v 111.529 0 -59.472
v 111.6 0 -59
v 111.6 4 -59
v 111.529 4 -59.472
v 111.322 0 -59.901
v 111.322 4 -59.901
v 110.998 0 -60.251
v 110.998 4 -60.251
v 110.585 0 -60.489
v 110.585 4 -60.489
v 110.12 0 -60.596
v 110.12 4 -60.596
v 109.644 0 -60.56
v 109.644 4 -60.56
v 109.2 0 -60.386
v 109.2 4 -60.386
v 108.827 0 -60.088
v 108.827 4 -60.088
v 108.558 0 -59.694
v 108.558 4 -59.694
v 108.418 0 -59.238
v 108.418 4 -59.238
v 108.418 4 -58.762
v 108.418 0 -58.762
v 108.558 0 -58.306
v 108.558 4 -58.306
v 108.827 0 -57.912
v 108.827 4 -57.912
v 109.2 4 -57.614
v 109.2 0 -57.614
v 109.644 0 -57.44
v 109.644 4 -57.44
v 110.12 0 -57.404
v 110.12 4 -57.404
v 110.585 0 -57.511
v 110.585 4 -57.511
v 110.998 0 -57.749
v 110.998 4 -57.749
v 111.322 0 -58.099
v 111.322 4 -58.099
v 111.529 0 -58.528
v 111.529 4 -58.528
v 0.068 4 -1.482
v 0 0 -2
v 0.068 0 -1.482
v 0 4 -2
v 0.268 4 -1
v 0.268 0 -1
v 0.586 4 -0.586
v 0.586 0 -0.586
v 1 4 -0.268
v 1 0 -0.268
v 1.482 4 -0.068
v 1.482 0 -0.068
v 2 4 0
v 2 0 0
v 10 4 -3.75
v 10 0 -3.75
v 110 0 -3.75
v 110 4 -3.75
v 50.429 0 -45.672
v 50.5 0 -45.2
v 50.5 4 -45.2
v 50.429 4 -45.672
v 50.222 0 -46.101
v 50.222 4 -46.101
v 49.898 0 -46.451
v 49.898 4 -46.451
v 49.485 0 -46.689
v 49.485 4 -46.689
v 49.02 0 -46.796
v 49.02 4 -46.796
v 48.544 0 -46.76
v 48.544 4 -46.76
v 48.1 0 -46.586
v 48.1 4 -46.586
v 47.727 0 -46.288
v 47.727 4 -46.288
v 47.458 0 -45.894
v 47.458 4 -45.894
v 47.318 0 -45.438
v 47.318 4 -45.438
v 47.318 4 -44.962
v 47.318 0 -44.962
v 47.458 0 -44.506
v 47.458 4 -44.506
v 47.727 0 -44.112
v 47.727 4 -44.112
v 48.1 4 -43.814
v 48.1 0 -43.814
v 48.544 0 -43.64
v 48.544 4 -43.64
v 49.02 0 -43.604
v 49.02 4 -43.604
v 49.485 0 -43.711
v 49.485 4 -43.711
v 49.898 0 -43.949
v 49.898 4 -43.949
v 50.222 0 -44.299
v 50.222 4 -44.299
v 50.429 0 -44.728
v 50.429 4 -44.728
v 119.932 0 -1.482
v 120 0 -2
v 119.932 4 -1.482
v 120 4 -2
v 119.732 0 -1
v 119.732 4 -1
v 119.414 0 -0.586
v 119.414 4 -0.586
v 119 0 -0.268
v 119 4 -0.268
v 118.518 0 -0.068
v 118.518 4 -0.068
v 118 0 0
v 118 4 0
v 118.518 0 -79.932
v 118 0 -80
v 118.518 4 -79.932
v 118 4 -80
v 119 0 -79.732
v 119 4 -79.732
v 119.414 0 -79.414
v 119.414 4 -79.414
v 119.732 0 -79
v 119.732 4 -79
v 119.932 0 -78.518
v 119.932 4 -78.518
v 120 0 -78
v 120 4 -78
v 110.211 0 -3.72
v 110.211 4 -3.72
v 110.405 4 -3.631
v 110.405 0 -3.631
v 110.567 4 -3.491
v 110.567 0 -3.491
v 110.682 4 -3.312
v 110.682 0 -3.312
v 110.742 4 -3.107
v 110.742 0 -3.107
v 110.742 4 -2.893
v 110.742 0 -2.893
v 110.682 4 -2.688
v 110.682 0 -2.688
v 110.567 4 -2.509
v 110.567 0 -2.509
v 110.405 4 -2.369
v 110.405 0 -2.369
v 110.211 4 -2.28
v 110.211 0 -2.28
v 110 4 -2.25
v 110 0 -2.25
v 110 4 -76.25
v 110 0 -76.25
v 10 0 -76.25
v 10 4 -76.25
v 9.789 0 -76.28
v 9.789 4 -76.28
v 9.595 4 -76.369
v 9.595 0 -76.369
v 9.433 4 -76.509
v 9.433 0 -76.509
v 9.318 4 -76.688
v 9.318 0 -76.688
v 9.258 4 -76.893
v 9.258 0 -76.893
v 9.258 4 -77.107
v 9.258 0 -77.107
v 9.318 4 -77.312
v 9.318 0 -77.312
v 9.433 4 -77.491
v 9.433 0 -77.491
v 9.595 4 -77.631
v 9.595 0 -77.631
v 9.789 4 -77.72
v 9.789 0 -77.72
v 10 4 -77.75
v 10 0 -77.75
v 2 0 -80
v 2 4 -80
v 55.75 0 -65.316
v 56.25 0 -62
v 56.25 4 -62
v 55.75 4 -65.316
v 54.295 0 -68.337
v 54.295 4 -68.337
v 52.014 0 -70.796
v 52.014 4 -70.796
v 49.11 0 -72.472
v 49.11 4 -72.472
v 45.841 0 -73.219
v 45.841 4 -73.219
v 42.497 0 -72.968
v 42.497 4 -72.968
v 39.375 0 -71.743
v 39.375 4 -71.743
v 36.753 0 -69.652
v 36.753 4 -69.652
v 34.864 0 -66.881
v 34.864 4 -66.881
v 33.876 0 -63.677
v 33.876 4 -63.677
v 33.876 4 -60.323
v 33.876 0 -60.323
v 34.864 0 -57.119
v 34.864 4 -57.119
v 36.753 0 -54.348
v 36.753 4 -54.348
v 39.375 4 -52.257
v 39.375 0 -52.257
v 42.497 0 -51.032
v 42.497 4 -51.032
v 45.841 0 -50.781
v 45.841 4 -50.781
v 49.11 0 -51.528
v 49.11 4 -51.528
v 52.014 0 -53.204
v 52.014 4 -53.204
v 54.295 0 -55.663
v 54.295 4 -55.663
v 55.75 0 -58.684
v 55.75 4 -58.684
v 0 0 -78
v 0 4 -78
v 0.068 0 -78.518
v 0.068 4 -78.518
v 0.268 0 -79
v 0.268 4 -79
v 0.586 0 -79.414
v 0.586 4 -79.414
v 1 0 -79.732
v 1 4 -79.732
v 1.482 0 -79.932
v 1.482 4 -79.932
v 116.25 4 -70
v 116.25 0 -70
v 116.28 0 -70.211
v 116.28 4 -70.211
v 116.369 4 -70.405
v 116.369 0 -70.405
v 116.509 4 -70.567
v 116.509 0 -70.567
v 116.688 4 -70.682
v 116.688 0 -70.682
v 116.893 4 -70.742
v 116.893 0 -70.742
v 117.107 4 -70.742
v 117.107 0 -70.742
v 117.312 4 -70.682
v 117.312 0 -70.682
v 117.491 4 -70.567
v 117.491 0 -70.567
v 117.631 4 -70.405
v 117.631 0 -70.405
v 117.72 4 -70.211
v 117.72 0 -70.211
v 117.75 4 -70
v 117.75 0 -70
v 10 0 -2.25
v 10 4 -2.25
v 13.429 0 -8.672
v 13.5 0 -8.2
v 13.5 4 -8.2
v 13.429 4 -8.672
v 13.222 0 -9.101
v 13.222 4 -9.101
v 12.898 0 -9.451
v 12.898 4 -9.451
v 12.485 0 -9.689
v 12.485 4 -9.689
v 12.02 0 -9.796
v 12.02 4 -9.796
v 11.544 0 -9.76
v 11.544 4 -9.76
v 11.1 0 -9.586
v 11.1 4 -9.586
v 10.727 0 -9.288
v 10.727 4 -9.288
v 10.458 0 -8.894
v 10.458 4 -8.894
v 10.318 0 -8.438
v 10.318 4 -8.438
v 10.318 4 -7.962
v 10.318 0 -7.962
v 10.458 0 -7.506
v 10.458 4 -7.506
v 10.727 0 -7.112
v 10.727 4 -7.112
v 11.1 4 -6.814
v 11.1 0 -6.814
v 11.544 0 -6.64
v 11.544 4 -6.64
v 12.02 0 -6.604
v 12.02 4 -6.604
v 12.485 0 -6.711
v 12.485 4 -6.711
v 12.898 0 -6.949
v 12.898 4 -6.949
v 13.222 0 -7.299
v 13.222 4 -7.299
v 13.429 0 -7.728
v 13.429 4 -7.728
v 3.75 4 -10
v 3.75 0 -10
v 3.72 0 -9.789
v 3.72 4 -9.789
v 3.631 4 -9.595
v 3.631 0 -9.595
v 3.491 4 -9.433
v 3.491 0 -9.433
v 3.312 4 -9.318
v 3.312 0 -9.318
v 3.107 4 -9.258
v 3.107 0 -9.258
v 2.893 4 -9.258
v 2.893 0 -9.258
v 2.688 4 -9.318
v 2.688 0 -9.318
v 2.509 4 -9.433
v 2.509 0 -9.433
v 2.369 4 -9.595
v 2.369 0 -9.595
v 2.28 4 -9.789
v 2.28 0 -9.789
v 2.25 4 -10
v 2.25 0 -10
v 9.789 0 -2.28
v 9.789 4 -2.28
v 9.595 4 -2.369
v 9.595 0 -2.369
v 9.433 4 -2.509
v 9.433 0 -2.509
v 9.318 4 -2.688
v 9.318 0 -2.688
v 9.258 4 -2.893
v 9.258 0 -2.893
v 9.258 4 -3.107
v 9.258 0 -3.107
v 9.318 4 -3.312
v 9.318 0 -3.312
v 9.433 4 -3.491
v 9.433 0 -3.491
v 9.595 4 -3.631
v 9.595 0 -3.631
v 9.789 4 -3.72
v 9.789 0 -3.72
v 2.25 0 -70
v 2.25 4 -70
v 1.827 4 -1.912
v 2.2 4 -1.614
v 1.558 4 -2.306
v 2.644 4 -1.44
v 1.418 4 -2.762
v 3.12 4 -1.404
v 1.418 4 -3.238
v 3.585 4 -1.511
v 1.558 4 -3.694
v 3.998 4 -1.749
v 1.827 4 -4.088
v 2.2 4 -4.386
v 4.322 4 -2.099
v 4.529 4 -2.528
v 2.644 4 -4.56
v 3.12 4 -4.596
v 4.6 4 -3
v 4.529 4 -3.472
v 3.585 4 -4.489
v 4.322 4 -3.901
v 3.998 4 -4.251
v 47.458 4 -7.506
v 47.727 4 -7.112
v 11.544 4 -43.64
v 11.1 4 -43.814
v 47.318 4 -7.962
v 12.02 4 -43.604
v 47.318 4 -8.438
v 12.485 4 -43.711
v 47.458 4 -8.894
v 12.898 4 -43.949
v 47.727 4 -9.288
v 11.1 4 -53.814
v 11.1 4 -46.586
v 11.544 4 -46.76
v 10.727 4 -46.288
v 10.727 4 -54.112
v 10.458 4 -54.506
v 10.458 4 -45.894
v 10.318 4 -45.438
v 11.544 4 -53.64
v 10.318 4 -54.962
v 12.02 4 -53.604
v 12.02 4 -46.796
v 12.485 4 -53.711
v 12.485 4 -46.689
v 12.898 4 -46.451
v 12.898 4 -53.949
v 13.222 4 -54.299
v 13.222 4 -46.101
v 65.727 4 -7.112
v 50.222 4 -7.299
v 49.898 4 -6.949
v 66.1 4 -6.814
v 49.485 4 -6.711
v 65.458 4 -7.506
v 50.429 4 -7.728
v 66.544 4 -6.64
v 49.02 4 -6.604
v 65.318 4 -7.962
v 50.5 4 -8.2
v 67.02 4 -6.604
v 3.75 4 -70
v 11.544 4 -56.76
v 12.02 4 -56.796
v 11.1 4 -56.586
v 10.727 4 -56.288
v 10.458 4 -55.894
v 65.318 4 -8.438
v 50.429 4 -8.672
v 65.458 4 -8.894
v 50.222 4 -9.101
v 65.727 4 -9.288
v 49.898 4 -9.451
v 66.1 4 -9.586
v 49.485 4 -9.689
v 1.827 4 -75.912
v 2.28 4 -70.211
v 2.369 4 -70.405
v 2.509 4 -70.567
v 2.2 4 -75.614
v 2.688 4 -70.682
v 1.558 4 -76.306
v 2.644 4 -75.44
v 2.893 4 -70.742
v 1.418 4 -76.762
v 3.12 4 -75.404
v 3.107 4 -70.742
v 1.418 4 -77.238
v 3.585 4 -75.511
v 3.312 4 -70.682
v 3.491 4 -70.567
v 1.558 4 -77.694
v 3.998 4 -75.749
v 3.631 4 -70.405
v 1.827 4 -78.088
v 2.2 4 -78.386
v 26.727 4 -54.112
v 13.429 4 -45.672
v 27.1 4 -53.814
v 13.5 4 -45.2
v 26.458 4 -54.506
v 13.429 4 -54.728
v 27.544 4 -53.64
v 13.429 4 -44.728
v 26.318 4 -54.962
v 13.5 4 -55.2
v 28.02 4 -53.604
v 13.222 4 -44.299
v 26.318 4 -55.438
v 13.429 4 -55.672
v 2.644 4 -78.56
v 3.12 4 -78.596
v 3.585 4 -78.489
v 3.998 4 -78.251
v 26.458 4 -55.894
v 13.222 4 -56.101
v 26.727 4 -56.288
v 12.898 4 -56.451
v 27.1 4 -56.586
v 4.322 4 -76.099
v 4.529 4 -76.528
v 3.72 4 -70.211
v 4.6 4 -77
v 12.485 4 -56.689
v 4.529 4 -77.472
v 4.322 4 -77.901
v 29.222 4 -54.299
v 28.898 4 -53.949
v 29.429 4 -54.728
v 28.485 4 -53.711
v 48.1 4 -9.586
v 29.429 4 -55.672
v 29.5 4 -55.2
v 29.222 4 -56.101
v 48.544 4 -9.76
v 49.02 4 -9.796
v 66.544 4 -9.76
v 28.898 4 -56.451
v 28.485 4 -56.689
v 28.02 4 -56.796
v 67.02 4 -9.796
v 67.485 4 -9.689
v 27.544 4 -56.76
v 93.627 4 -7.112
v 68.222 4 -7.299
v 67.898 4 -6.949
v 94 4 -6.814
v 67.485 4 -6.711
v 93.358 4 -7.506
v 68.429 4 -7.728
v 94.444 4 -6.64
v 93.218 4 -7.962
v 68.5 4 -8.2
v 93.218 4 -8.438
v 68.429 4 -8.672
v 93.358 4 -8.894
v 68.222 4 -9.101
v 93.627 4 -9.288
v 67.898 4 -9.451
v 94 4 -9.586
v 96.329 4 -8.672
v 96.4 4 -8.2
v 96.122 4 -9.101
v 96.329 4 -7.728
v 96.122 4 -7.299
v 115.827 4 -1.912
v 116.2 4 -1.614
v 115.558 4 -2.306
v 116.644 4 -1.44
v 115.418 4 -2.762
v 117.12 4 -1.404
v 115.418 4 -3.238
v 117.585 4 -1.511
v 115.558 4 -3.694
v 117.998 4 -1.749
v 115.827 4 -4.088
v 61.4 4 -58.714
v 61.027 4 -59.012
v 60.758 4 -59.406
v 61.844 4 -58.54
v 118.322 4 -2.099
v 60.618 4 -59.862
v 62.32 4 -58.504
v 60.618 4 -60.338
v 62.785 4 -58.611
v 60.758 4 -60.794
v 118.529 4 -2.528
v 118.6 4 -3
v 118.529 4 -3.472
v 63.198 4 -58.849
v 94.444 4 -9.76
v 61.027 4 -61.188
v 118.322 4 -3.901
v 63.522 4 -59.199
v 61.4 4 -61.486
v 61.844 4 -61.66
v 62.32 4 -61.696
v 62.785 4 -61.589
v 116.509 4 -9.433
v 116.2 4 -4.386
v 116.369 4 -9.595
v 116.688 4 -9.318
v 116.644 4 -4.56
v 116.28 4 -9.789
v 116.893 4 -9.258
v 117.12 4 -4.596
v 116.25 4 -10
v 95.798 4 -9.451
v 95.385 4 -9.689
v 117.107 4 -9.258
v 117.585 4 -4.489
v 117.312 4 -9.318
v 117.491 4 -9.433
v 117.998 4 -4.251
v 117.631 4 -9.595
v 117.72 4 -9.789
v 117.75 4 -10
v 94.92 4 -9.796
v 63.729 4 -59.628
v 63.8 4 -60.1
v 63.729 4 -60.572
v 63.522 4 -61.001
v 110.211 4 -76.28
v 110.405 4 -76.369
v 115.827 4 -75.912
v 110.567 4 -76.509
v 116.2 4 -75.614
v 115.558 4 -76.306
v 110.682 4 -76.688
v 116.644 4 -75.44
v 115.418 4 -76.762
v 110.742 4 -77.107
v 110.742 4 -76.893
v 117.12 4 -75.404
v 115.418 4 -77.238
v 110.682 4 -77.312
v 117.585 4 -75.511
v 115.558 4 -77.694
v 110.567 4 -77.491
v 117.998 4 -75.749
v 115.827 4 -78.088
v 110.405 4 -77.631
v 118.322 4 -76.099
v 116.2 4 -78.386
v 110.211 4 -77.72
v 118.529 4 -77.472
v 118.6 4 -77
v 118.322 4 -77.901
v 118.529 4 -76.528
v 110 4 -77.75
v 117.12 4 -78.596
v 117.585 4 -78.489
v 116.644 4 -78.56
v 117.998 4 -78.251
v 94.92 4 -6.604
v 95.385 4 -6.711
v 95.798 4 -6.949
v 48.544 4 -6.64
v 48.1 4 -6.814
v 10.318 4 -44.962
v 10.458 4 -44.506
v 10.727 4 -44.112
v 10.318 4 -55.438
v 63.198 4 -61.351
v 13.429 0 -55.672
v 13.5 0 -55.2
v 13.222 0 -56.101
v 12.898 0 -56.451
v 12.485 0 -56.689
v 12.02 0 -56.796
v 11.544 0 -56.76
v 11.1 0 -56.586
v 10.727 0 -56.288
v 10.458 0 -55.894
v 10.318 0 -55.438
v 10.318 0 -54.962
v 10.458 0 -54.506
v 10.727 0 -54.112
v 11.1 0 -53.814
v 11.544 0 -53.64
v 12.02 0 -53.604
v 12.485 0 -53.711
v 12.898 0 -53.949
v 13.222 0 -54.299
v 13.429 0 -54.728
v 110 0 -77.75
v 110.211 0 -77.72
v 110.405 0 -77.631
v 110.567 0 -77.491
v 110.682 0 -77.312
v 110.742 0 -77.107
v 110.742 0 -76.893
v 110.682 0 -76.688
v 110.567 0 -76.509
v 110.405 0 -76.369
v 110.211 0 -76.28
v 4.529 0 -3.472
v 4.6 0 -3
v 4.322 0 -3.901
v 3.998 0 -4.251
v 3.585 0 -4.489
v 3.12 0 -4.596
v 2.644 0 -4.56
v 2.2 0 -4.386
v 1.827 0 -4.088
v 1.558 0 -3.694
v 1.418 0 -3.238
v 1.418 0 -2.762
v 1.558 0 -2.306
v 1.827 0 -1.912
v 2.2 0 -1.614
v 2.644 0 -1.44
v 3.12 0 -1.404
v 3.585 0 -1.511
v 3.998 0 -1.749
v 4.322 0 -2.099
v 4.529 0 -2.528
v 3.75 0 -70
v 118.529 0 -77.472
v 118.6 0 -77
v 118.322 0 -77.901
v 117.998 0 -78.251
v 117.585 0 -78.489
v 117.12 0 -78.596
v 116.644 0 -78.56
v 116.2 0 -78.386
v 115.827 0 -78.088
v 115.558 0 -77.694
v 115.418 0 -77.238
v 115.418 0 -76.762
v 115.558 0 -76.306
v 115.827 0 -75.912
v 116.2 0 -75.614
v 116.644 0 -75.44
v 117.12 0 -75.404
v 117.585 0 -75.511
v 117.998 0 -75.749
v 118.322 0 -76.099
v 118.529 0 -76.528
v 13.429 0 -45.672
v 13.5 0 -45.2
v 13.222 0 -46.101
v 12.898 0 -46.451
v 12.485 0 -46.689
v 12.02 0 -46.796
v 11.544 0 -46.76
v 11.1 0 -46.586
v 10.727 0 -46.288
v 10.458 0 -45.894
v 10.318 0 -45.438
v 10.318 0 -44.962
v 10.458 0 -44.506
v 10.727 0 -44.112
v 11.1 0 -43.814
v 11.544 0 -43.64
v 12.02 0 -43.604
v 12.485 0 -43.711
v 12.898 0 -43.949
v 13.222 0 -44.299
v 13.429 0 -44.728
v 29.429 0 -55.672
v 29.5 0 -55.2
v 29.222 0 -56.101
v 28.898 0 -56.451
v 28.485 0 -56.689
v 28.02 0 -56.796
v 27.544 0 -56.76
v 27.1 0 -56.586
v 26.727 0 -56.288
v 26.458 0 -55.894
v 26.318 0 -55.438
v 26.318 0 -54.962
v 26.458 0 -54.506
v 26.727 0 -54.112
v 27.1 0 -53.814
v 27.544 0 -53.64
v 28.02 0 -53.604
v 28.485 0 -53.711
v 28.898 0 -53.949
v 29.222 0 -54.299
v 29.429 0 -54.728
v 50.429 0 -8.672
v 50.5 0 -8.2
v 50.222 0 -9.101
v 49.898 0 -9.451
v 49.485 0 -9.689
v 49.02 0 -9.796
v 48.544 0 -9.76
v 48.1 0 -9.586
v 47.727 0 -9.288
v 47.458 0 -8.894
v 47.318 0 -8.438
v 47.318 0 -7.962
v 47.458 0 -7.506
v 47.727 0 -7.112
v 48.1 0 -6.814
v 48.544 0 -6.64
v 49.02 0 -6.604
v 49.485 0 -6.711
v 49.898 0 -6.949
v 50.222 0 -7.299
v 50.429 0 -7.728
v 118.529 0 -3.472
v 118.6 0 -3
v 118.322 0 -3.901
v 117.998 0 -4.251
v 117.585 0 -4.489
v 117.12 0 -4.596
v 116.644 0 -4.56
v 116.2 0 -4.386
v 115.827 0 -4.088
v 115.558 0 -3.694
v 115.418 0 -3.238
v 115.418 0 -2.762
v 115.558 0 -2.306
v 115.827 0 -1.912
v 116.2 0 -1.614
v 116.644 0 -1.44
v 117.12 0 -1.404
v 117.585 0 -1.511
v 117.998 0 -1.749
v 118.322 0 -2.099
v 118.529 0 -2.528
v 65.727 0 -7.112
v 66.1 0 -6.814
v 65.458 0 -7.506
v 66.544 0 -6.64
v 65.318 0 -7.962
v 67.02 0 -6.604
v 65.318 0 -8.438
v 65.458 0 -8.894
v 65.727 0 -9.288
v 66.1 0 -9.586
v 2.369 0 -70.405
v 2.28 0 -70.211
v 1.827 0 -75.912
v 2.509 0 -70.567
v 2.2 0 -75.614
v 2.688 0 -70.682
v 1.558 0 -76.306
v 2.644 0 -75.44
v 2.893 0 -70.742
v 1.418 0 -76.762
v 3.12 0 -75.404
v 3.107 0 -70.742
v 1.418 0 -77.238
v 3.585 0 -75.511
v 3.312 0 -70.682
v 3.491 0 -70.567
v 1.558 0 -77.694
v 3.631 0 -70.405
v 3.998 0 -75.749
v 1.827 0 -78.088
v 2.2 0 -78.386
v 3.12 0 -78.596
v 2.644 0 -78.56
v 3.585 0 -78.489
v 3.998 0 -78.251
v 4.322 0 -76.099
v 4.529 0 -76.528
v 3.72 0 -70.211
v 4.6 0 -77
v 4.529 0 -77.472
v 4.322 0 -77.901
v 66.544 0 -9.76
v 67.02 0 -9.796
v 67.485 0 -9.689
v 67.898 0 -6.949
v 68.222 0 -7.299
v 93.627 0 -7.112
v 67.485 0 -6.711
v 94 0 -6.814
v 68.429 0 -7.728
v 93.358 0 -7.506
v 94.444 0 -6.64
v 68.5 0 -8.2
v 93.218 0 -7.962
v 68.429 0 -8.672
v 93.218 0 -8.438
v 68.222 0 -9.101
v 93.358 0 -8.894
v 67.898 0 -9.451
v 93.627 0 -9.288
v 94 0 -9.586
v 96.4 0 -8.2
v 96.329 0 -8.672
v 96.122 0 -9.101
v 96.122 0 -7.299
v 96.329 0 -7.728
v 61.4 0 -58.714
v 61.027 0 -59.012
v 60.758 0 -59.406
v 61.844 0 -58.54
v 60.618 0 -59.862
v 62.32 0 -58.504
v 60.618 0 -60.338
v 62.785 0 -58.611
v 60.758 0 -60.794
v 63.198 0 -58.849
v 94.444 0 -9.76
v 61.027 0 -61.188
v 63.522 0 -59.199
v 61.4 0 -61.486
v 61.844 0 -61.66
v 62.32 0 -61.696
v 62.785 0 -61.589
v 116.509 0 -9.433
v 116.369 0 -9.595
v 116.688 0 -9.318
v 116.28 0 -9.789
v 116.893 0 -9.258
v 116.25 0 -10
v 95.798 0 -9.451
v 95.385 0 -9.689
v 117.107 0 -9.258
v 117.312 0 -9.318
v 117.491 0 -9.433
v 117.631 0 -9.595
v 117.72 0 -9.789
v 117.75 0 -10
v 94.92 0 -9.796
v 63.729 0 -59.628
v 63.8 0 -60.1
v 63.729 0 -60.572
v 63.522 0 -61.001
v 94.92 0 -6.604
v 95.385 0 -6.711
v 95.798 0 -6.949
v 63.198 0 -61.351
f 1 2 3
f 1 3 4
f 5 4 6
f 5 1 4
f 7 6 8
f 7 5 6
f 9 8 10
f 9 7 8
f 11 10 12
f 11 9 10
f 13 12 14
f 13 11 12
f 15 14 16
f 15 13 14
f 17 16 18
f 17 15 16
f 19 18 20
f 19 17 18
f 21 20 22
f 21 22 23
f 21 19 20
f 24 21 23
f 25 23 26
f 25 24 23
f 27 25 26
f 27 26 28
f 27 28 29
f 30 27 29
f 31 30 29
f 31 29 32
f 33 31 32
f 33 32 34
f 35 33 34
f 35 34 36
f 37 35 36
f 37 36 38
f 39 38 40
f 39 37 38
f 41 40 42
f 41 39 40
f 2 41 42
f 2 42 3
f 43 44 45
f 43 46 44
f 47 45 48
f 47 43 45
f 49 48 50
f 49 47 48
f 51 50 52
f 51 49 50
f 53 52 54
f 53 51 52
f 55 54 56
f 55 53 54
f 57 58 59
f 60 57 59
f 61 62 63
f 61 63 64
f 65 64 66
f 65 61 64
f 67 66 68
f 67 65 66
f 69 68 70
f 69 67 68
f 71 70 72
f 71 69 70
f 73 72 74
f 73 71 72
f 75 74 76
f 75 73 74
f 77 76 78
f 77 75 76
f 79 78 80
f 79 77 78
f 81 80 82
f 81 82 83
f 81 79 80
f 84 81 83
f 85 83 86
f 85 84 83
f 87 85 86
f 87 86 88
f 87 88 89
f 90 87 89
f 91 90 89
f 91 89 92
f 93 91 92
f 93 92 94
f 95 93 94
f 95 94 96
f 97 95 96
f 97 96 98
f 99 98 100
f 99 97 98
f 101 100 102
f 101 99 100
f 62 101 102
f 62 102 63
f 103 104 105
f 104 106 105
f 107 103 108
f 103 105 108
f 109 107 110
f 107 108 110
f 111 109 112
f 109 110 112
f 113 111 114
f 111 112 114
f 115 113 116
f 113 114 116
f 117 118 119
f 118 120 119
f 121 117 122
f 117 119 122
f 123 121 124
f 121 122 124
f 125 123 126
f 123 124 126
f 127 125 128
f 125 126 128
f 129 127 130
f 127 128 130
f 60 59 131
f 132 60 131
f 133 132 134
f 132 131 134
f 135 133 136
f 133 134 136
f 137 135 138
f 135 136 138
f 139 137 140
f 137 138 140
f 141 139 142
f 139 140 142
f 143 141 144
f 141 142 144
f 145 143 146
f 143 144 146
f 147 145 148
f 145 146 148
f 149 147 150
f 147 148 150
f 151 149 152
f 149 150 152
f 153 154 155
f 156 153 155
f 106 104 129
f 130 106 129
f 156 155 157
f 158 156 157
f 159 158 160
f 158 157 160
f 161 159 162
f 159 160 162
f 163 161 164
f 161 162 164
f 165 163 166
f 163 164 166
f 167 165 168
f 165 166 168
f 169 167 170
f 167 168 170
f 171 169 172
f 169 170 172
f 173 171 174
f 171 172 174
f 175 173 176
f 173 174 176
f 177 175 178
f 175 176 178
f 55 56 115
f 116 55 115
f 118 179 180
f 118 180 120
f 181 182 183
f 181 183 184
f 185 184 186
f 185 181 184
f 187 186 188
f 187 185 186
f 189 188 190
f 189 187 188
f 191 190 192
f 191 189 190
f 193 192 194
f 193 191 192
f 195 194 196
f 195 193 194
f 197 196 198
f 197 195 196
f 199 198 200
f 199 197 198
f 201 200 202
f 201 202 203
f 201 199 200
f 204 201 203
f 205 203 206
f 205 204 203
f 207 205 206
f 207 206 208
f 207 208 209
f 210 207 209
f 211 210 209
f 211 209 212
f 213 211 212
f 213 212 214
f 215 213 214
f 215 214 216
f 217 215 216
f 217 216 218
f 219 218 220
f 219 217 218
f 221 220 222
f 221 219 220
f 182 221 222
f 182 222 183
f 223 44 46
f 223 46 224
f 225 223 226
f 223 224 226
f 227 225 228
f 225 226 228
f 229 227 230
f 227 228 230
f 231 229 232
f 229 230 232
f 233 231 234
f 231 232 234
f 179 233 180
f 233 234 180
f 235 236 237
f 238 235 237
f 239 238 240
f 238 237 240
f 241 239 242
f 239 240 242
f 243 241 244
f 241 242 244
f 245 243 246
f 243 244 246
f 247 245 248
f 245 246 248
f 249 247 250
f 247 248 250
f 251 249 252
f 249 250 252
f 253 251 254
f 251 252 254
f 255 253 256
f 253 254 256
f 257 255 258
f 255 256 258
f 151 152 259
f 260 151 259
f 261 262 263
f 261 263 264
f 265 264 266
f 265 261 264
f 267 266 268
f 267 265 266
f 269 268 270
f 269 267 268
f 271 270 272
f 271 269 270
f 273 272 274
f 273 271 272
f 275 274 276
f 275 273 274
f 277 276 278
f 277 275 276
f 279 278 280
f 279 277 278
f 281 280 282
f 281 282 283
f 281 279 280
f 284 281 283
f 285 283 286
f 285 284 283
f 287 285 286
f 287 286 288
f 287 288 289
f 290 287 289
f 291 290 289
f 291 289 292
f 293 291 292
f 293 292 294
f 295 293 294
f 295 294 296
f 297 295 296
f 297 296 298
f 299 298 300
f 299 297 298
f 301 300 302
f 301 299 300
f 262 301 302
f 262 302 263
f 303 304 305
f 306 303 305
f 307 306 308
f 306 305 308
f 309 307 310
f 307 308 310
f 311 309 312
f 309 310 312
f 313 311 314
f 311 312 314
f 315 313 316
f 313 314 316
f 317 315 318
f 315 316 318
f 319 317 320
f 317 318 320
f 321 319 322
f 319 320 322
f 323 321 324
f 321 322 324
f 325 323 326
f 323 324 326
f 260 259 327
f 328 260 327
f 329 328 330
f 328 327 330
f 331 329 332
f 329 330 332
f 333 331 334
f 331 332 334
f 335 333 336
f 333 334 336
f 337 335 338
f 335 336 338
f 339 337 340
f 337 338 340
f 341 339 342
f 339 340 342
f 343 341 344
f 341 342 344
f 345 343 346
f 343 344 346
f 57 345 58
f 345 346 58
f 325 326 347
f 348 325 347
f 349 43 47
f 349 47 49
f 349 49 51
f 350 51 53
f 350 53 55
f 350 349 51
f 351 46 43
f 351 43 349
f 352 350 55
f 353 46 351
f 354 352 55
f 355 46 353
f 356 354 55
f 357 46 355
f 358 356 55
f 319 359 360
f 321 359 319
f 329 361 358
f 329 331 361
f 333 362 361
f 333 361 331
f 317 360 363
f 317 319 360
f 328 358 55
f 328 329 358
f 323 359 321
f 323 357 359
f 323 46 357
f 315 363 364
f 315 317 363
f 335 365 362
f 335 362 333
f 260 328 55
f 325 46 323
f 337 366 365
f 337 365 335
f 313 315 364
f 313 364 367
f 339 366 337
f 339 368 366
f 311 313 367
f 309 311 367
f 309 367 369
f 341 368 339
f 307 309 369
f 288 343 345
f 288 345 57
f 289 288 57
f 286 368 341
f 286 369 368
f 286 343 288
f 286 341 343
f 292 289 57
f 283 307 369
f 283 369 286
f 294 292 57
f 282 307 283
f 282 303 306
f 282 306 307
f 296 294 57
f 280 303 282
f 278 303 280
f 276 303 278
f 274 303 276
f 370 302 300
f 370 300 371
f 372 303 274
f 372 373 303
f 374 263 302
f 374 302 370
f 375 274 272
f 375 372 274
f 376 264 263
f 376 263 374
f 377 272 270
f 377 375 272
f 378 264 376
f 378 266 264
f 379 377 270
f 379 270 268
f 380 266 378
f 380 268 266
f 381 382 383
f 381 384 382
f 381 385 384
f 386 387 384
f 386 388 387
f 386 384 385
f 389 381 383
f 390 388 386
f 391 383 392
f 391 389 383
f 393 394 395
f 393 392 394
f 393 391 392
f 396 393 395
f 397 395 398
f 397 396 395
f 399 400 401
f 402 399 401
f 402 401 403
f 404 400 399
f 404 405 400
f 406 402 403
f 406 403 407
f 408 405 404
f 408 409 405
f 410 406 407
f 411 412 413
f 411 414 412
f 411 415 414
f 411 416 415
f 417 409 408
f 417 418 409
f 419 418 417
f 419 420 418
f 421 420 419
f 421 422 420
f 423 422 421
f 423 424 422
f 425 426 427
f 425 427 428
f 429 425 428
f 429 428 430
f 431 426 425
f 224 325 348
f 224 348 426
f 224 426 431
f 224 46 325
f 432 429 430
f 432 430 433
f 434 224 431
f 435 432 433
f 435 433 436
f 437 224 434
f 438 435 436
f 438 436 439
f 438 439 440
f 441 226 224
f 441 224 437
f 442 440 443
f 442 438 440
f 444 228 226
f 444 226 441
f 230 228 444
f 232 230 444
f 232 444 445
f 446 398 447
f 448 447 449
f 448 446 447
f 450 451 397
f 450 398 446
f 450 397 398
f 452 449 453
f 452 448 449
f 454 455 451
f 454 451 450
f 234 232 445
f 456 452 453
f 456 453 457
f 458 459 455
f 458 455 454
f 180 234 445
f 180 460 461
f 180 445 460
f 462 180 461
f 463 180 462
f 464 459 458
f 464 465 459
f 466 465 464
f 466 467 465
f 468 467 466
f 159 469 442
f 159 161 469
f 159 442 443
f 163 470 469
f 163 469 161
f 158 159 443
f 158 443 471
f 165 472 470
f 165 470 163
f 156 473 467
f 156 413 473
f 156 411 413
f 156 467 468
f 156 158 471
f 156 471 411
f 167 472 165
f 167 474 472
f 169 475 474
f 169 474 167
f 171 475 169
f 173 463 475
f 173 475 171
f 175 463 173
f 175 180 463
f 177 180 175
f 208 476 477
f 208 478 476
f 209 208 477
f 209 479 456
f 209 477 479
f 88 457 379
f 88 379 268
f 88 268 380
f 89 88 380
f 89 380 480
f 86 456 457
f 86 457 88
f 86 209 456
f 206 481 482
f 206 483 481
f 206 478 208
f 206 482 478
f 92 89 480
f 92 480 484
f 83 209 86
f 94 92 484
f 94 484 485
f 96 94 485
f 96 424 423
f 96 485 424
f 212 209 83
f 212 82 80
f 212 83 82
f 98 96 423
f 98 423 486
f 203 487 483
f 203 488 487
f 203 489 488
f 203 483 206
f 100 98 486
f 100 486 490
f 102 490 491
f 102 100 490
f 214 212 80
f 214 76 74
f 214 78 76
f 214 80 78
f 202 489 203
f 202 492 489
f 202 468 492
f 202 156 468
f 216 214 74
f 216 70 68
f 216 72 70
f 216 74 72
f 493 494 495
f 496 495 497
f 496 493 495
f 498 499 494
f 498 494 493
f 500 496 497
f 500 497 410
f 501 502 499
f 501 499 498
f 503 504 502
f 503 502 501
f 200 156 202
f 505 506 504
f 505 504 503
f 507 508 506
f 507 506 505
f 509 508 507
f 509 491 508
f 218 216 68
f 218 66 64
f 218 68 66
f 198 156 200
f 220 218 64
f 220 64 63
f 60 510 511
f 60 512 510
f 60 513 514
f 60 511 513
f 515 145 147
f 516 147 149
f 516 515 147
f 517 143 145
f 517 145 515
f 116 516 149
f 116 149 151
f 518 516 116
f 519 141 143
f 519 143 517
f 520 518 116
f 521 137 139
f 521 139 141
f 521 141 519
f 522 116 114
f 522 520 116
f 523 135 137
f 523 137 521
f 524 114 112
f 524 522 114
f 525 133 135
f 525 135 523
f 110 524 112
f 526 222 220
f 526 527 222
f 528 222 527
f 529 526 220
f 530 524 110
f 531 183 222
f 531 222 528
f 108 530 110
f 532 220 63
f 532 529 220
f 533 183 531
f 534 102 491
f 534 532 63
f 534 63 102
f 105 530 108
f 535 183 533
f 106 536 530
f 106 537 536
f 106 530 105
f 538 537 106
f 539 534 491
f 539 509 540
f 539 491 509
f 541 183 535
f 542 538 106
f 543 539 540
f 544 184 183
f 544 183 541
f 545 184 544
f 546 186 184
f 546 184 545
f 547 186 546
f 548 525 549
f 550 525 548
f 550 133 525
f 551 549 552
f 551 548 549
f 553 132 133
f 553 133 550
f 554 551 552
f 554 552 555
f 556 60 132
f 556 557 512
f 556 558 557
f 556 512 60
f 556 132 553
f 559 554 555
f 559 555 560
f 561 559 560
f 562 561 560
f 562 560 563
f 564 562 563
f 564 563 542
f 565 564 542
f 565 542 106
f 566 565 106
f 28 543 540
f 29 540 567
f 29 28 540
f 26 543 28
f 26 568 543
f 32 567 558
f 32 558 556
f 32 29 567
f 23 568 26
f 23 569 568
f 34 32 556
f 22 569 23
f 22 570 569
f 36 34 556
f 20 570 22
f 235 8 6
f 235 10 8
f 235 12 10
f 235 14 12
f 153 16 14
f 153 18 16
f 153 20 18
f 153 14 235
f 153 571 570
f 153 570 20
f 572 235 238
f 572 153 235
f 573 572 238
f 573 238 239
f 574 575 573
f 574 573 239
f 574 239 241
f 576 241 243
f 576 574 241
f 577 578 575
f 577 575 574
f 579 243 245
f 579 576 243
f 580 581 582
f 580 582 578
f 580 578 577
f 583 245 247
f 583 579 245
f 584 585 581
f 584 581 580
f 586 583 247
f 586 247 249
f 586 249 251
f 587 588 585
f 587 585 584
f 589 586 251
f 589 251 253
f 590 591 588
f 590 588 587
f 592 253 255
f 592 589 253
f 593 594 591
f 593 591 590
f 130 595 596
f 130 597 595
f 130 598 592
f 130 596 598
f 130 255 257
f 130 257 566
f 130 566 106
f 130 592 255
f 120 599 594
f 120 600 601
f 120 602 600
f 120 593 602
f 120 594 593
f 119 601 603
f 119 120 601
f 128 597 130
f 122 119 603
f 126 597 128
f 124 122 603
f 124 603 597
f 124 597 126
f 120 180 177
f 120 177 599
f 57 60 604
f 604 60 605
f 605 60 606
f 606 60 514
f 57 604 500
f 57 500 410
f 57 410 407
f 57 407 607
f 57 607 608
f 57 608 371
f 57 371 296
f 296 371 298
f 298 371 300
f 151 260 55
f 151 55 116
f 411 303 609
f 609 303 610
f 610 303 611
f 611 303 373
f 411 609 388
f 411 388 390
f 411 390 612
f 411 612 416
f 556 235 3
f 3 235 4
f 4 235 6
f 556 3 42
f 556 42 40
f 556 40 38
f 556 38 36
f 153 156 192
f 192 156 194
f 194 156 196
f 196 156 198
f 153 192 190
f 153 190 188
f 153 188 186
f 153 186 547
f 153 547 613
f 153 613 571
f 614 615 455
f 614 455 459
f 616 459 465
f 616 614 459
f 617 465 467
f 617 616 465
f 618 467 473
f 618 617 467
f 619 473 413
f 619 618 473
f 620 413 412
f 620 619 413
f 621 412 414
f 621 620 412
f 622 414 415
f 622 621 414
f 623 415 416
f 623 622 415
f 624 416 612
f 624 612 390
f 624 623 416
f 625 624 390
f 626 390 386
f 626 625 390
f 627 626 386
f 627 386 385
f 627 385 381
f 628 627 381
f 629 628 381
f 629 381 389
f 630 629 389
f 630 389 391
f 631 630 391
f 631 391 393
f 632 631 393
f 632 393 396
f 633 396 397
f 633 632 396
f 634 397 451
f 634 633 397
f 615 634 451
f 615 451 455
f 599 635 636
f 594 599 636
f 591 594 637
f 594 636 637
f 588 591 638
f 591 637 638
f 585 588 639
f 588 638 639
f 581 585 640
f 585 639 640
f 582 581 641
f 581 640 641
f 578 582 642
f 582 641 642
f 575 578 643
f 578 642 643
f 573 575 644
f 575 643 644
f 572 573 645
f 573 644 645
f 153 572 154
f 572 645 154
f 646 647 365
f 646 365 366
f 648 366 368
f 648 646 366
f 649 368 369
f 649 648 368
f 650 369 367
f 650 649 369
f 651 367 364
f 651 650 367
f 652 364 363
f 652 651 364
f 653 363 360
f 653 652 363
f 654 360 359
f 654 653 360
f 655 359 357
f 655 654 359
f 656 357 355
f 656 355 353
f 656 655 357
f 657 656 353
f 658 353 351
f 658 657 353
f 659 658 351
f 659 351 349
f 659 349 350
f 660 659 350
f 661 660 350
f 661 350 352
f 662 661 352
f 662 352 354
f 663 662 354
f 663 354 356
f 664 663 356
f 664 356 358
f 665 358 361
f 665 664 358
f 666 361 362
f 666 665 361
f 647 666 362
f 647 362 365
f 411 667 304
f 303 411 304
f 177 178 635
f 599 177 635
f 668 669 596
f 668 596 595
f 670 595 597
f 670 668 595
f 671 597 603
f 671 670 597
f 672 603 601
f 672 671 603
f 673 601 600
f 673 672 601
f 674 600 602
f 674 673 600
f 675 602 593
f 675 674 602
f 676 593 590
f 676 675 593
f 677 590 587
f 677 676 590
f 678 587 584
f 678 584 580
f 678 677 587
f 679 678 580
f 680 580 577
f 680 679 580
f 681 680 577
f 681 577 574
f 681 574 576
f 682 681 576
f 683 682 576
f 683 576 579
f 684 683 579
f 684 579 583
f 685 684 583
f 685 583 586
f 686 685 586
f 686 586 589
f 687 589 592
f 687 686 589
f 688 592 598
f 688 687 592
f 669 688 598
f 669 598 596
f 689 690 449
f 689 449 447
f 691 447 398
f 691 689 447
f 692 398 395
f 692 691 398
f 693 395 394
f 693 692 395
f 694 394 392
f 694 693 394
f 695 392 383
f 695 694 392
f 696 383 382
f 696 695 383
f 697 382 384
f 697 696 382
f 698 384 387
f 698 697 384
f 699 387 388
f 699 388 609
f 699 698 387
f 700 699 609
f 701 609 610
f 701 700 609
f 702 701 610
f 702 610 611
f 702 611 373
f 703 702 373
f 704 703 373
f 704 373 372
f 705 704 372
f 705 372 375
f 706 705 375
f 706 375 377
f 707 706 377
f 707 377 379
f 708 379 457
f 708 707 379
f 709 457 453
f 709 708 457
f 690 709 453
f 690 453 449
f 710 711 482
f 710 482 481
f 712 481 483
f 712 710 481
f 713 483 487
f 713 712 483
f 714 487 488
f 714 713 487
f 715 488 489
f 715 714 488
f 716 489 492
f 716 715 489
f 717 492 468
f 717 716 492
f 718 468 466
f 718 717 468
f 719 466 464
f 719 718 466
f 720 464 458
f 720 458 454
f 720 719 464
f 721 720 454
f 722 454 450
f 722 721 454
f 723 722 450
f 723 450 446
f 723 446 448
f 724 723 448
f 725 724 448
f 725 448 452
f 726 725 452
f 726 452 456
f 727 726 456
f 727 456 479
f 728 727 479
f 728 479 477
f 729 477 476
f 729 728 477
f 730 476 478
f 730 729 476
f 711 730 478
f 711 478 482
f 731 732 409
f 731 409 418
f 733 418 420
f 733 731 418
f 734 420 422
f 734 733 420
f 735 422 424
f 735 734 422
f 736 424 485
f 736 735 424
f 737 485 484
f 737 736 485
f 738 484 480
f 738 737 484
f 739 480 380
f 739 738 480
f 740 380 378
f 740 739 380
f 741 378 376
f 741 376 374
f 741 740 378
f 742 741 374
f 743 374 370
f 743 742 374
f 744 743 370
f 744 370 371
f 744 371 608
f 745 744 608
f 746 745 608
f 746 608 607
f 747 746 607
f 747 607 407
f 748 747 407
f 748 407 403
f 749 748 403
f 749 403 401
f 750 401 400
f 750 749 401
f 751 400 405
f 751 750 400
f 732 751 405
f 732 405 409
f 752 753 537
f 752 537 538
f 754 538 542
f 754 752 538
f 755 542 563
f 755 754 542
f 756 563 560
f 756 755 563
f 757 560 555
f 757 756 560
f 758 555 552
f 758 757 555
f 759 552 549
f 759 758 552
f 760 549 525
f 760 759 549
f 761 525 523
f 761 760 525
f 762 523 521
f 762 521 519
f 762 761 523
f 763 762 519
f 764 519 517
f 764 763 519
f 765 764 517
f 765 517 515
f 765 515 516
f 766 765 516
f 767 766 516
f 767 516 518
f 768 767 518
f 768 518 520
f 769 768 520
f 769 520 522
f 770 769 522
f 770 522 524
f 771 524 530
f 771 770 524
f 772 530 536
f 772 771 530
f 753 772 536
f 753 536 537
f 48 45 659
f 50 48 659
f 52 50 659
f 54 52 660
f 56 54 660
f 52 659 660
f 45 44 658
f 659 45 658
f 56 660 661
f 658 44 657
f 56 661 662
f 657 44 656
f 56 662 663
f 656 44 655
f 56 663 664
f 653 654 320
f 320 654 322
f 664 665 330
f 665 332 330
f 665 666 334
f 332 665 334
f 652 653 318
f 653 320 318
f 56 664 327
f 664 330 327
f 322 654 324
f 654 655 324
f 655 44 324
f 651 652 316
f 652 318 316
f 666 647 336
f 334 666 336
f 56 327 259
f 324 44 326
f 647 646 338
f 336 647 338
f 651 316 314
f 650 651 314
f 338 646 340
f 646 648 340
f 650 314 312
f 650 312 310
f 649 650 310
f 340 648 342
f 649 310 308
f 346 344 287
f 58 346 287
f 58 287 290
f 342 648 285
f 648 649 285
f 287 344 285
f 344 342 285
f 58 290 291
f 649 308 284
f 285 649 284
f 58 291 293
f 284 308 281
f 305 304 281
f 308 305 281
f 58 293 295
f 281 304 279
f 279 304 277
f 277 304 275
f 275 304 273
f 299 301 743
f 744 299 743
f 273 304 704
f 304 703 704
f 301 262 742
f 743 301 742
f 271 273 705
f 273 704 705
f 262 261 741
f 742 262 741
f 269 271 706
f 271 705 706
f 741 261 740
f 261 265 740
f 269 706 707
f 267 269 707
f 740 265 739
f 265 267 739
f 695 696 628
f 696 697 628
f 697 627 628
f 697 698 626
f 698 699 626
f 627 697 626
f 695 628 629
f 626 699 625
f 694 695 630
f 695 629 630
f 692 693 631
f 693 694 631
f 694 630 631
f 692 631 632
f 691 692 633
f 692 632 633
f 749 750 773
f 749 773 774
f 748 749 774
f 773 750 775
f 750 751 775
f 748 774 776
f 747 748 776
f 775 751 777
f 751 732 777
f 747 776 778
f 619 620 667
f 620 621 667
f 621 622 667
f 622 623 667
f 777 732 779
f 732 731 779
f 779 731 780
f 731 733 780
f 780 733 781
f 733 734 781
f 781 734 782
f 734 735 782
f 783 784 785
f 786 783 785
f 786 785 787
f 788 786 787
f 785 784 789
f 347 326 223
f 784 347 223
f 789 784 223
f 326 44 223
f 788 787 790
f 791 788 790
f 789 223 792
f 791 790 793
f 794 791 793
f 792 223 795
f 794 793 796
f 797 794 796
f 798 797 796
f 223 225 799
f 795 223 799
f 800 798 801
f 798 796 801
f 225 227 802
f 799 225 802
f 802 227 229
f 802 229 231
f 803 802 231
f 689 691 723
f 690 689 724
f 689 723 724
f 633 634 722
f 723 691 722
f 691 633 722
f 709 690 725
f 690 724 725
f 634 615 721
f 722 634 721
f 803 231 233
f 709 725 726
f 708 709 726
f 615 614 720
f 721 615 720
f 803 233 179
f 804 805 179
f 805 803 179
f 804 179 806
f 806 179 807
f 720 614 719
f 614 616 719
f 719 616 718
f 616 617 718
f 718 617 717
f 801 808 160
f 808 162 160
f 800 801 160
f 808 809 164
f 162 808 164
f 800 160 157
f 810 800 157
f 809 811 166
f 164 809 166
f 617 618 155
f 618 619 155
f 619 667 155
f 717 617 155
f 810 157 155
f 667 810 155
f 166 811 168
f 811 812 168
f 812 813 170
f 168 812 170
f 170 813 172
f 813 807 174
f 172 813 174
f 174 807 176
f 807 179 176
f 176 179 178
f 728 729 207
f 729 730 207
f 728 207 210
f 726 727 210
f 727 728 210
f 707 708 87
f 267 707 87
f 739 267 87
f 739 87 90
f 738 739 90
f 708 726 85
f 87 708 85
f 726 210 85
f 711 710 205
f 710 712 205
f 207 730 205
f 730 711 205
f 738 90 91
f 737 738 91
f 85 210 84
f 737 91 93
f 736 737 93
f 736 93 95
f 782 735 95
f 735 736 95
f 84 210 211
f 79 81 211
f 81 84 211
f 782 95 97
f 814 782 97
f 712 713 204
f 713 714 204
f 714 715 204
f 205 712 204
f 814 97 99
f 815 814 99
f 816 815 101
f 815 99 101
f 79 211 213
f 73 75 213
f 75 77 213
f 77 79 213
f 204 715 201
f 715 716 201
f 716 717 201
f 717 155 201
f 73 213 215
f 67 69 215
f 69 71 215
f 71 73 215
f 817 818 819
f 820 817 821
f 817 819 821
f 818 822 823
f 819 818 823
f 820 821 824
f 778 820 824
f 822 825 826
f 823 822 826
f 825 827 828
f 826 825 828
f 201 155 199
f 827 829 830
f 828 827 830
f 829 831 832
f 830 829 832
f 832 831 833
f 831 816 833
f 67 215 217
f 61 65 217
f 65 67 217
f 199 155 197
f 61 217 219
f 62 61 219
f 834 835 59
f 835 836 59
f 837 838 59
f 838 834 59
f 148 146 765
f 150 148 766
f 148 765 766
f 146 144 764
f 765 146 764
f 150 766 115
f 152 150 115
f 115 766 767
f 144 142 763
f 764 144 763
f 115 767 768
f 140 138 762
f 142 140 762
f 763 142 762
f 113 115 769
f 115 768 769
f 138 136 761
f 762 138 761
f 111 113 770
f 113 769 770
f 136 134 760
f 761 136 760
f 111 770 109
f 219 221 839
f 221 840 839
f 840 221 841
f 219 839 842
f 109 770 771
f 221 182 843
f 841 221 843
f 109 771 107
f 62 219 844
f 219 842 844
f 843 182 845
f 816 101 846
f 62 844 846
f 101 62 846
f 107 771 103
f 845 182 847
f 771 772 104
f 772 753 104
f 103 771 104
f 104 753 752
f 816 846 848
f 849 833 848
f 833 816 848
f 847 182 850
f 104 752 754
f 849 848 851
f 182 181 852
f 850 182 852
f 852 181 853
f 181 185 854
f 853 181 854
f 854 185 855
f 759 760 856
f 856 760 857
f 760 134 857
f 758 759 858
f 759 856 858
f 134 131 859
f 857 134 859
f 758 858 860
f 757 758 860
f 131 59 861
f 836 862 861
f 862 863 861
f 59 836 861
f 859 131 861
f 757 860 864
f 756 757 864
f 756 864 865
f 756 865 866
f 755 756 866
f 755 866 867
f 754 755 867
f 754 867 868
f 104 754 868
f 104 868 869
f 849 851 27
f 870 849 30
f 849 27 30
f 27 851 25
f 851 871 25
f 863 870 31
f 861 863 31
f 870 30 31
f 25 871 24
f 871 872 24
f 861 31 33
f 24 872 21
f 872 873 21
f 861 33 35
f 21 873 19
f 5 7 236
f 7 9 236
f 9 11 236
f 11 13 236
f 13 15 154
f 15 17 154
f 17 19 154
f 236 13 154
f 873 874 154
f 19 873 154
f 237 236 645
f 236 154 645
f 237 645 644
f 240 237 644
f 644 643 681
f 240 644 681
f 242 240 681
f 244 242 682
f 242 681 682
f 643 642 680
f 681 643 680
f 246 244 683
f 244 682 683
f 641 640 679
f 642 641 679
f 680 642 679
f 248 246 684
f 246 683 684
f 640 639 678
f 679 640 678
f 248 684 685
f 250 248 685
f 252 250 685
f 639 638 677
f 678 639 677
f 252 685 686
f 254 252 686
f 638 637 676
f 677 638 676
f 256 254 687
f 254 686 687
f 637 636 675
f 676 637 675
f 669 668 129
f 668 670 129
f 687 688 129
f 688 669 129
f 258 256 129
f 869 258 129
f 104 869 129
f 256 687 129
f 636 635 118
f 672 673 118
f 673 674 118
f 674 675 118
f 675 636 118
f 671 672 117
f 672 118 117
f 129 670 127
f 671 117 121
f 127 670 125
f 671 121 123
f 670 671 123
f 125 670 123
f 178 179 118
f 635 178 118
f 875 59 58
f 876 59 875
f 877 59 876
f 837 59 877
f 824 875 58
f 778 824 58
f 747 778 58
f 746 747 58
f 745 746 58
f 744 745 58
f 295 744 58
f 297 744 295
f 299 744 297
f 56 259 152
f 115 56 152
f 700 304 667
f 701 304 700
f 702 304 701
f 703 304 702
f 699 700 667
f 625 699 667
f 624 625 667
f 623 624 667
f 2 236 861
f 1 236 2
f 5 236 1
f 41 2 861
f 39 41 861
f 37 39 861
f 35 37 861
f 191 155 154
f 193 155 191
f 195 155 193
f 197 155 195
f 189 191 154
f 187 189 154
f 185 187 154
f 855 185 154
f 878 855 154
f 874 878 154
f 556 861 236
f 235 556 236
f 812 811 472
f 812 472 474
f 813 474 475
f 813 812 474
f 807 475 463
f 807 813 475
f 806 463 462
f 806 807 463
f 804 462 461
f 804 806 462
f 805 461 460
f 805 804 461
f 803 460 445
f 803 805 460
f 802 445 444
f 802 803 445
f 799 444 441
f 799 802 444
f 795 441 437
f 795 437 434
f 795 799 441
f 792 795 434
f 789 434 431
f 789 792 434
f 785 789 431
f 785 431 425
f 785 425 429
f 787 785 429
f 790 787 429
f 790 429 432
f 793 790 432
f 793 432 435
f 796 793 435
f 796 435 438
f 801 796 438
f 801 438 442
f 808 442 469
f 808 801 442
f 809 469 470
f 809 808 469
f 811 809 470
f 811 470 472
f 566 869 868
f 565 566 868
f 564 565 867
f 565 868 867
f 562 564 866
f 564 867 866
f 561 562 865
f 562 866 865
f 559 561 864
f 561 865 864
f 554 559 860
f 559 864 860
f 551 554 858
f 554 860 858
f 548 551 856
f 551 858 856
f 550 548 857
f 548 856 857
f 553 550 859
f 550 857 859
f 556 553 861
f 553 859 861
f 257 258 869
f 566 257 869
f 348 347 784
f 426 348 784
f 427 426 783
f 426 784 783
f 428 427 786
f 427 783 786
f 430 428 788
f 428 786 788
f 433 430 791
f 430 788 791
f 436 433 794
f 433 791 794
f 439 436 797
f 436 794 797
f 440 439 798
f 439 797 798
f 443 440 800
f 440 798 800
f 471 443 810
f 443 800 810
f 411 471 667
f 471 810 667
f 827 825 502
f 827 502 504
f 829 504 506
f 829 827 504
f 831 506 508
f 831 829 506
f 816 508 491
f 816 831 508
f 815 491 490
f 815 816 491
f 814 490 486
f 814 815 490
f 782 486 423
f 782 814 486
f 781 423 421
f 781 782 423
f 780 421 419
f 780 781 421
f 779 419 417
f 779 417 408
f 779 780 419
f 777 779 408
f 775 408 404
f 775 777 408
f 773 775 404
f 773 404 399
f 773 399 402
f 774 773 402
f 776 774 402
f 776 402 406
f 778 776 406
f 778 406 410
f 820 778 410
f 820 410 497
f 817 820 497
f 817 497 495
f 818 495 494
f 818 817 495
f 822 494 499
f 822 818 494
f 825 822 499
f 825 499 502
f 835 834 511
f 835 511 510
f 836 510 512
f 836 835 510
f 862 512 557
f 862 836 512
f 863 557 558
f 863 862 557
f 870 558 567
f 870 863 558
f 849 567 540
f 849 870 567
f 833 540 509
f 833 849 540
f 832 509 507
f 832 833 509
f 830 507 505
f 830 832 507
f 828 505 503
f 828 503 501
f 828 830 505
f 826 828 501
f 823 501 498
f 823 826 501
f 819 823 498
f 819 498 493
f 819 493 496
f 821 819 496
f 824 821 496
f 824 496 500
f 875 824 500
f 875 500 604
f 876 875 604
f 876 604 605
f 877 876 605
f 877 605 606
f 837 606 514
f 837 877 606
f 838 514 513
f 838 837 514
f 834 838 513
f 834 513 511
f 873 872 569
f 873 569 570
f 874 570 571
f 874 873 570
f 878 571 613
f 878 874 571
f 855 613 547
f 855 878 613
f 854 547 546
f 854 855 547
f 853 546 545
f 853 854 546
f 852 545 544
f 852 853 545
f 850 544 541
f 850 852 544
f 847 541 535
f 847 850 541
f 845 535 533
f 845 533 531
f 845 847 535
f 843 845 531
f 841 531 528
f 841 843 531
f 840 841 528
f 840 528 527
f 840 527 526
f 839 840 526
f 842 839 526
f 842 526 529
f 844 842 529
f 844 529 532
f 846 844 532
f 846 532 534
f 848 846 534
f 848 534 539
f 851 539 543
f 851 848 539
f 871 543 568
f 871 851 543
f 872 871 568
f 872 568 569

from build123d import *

# Parameters (mm, degrees)
SKETCH1_W           = 120
SKETCH1_H           = 80
SKETCH1_R           = 1.6
SKETCH1_R_2         = 11.25
BOSS_EXTRUDE3_DEPTH = 4
FILLET5_R           = 2
FILLET6_R           = 2
FILLET7_R           = 2
FILLET8_R           = 2


with BuildPart() as part:
    # Sketch1 → Boss-Extrude3 (new body)
    with BuildSketch(Plane(origin=(0, 0, 0), x_dir=(1, 0, 0), z_dir=(0, 1, 0))):
        with Locations((60, 40)):
            Rectangle(SKETCH1_W, SKETCH1_H)
        with Locations((3, 77)):
            Circle(SKETCH1_R, mode=Mode.SUBTRACT)
        with Locations((3, 3)):
            Circle(SKETCH1_R, mode=Mode.SUBTRACT)
        with Locations((117, 77)):
            Circle(SKETCH1_R, mode=Mode.SUBTRACT)
        with Locations((117, 3)):
            Circle(SKETCH1_R, mode=Mode.SUBTRACT)
        with Locations((110, 59)):
            Circle(SKETCH1_R, mode=Mode.SUBTRACT)
        with Locations((94.8, 8.2)):
            Circle(SKETCH1_R, mode=Mode.SUBTRACT)
        with Locations((66.9, 8.2)):
            Circle(SKETCH1_R, mode=Mode.SUBTRACT)
        with Locations((11.9, 8.2)):
            Circle(SKETCH1_R, mode=Mode.SUBTRACT)
        with Locations((48.9, 8.2)):
            Circle(SKETCH1_R, mode=Mode.SUBTRACT)
        with Locations((11.9, 45.2)):
            Circle(SKETCH1_R, mode=Mode.SUBTRACT)
        with Locations((48.9, 45.2)):
            Circle(SKETCH1_R, mode=Mode.SUBTRACT)
        with Locations((11.9, 55.2)):
            Circle(SKETCH1_R, mode=Mode.SUBTRACT)
        with Locations((27.9, 55.2)):
            Circle(SKETCH1_R, mode=Mode.SUBTRACT)
        with Locations((45, 62)):
            Circle(SKETCH1_R_2, mode=Mode.SUBTRACT)
        with Locations((62.2, 60.1)):
            Circle(SKETCH1_R, mode=Mode.SUBTRACT)
        with BuildLine():
            Line((10, 77.75), (110, 77.75))
            ThreePointArc((110, 77.75), (110.75, 77), (110, 76.25))
            Line((110, 76.25), (10, 76.25))
            ThreePointArc((10, 76.25), (9.25, 77), (10, 77.75))
        make_face(mode=Mode.SUBTRACT)
        with BuildLine():
            Line((3.75, 70), (3.75, 10))
            ThreePointArc((3.75, 10), (3, 9.25), (2.25, 10))
            Line((2.25, 10), (2.25, 70))
            ThreePointArc((2.25, 70), (3, 70.75), (3.75, 70))
        make_face(mode=Mode.SUBTRACT)
        with BuildLine():
            Line((10, 3.75), (110, 3.75))
            ThreePointArc((110, 3.75), (110.75, 3), (110, 2.25))
            Line((110, 2.25), (10, 2.25))
            ThreePointArc((10, 2.25), (9.25, 3), (10, 3.75))
        make_face(mode=Mode.SUBTRACT)
        with BuildLine():
            Line((117.75, 70), (117.75, 10))
            ThreePointArc((117.75, 10), (117, 9.25), (116.25, 10))
            Line((116.25, 10), (116.25, 70))
            ThreePointArc((116.25, 70), (117, 70.75), (117.75, 70))
        make_face(mode=Mode.SUBTRACT)
    extrude(amount=BOSS_EXTRUDE3_DEPTH)

    # Fillet5
    fillet5_edges = [part.edges().sort_by_distance(p)[0] for p in [
        (0, 2, 0),
    ]]
    fillet(fillet5_edges, radius=FILLET5_R)

    # Fillet6
    fillet6_edges = [part.edges().sort_by_distance(p)[0] for p in [
        (0, 2, -80),
    ]]
    fillet(fillet6_edges, radius=FILLET6_R)

    # Fillet7
    fillet7_edges = [part.edges().sort_by_distance(p)[0] for p in [
        (120, 2, -80),
    ]]
    fillet(fillet7_edges, radius=FILLET7_R)

    # Fillet8
    fillet8_edges = [part.edges().sort_by_distance(p)[0] for p in [
        (120, 2, 0),
    ]]
    fillet(fillet8_edges, radius=FILLET8_R)


solid = part.part
